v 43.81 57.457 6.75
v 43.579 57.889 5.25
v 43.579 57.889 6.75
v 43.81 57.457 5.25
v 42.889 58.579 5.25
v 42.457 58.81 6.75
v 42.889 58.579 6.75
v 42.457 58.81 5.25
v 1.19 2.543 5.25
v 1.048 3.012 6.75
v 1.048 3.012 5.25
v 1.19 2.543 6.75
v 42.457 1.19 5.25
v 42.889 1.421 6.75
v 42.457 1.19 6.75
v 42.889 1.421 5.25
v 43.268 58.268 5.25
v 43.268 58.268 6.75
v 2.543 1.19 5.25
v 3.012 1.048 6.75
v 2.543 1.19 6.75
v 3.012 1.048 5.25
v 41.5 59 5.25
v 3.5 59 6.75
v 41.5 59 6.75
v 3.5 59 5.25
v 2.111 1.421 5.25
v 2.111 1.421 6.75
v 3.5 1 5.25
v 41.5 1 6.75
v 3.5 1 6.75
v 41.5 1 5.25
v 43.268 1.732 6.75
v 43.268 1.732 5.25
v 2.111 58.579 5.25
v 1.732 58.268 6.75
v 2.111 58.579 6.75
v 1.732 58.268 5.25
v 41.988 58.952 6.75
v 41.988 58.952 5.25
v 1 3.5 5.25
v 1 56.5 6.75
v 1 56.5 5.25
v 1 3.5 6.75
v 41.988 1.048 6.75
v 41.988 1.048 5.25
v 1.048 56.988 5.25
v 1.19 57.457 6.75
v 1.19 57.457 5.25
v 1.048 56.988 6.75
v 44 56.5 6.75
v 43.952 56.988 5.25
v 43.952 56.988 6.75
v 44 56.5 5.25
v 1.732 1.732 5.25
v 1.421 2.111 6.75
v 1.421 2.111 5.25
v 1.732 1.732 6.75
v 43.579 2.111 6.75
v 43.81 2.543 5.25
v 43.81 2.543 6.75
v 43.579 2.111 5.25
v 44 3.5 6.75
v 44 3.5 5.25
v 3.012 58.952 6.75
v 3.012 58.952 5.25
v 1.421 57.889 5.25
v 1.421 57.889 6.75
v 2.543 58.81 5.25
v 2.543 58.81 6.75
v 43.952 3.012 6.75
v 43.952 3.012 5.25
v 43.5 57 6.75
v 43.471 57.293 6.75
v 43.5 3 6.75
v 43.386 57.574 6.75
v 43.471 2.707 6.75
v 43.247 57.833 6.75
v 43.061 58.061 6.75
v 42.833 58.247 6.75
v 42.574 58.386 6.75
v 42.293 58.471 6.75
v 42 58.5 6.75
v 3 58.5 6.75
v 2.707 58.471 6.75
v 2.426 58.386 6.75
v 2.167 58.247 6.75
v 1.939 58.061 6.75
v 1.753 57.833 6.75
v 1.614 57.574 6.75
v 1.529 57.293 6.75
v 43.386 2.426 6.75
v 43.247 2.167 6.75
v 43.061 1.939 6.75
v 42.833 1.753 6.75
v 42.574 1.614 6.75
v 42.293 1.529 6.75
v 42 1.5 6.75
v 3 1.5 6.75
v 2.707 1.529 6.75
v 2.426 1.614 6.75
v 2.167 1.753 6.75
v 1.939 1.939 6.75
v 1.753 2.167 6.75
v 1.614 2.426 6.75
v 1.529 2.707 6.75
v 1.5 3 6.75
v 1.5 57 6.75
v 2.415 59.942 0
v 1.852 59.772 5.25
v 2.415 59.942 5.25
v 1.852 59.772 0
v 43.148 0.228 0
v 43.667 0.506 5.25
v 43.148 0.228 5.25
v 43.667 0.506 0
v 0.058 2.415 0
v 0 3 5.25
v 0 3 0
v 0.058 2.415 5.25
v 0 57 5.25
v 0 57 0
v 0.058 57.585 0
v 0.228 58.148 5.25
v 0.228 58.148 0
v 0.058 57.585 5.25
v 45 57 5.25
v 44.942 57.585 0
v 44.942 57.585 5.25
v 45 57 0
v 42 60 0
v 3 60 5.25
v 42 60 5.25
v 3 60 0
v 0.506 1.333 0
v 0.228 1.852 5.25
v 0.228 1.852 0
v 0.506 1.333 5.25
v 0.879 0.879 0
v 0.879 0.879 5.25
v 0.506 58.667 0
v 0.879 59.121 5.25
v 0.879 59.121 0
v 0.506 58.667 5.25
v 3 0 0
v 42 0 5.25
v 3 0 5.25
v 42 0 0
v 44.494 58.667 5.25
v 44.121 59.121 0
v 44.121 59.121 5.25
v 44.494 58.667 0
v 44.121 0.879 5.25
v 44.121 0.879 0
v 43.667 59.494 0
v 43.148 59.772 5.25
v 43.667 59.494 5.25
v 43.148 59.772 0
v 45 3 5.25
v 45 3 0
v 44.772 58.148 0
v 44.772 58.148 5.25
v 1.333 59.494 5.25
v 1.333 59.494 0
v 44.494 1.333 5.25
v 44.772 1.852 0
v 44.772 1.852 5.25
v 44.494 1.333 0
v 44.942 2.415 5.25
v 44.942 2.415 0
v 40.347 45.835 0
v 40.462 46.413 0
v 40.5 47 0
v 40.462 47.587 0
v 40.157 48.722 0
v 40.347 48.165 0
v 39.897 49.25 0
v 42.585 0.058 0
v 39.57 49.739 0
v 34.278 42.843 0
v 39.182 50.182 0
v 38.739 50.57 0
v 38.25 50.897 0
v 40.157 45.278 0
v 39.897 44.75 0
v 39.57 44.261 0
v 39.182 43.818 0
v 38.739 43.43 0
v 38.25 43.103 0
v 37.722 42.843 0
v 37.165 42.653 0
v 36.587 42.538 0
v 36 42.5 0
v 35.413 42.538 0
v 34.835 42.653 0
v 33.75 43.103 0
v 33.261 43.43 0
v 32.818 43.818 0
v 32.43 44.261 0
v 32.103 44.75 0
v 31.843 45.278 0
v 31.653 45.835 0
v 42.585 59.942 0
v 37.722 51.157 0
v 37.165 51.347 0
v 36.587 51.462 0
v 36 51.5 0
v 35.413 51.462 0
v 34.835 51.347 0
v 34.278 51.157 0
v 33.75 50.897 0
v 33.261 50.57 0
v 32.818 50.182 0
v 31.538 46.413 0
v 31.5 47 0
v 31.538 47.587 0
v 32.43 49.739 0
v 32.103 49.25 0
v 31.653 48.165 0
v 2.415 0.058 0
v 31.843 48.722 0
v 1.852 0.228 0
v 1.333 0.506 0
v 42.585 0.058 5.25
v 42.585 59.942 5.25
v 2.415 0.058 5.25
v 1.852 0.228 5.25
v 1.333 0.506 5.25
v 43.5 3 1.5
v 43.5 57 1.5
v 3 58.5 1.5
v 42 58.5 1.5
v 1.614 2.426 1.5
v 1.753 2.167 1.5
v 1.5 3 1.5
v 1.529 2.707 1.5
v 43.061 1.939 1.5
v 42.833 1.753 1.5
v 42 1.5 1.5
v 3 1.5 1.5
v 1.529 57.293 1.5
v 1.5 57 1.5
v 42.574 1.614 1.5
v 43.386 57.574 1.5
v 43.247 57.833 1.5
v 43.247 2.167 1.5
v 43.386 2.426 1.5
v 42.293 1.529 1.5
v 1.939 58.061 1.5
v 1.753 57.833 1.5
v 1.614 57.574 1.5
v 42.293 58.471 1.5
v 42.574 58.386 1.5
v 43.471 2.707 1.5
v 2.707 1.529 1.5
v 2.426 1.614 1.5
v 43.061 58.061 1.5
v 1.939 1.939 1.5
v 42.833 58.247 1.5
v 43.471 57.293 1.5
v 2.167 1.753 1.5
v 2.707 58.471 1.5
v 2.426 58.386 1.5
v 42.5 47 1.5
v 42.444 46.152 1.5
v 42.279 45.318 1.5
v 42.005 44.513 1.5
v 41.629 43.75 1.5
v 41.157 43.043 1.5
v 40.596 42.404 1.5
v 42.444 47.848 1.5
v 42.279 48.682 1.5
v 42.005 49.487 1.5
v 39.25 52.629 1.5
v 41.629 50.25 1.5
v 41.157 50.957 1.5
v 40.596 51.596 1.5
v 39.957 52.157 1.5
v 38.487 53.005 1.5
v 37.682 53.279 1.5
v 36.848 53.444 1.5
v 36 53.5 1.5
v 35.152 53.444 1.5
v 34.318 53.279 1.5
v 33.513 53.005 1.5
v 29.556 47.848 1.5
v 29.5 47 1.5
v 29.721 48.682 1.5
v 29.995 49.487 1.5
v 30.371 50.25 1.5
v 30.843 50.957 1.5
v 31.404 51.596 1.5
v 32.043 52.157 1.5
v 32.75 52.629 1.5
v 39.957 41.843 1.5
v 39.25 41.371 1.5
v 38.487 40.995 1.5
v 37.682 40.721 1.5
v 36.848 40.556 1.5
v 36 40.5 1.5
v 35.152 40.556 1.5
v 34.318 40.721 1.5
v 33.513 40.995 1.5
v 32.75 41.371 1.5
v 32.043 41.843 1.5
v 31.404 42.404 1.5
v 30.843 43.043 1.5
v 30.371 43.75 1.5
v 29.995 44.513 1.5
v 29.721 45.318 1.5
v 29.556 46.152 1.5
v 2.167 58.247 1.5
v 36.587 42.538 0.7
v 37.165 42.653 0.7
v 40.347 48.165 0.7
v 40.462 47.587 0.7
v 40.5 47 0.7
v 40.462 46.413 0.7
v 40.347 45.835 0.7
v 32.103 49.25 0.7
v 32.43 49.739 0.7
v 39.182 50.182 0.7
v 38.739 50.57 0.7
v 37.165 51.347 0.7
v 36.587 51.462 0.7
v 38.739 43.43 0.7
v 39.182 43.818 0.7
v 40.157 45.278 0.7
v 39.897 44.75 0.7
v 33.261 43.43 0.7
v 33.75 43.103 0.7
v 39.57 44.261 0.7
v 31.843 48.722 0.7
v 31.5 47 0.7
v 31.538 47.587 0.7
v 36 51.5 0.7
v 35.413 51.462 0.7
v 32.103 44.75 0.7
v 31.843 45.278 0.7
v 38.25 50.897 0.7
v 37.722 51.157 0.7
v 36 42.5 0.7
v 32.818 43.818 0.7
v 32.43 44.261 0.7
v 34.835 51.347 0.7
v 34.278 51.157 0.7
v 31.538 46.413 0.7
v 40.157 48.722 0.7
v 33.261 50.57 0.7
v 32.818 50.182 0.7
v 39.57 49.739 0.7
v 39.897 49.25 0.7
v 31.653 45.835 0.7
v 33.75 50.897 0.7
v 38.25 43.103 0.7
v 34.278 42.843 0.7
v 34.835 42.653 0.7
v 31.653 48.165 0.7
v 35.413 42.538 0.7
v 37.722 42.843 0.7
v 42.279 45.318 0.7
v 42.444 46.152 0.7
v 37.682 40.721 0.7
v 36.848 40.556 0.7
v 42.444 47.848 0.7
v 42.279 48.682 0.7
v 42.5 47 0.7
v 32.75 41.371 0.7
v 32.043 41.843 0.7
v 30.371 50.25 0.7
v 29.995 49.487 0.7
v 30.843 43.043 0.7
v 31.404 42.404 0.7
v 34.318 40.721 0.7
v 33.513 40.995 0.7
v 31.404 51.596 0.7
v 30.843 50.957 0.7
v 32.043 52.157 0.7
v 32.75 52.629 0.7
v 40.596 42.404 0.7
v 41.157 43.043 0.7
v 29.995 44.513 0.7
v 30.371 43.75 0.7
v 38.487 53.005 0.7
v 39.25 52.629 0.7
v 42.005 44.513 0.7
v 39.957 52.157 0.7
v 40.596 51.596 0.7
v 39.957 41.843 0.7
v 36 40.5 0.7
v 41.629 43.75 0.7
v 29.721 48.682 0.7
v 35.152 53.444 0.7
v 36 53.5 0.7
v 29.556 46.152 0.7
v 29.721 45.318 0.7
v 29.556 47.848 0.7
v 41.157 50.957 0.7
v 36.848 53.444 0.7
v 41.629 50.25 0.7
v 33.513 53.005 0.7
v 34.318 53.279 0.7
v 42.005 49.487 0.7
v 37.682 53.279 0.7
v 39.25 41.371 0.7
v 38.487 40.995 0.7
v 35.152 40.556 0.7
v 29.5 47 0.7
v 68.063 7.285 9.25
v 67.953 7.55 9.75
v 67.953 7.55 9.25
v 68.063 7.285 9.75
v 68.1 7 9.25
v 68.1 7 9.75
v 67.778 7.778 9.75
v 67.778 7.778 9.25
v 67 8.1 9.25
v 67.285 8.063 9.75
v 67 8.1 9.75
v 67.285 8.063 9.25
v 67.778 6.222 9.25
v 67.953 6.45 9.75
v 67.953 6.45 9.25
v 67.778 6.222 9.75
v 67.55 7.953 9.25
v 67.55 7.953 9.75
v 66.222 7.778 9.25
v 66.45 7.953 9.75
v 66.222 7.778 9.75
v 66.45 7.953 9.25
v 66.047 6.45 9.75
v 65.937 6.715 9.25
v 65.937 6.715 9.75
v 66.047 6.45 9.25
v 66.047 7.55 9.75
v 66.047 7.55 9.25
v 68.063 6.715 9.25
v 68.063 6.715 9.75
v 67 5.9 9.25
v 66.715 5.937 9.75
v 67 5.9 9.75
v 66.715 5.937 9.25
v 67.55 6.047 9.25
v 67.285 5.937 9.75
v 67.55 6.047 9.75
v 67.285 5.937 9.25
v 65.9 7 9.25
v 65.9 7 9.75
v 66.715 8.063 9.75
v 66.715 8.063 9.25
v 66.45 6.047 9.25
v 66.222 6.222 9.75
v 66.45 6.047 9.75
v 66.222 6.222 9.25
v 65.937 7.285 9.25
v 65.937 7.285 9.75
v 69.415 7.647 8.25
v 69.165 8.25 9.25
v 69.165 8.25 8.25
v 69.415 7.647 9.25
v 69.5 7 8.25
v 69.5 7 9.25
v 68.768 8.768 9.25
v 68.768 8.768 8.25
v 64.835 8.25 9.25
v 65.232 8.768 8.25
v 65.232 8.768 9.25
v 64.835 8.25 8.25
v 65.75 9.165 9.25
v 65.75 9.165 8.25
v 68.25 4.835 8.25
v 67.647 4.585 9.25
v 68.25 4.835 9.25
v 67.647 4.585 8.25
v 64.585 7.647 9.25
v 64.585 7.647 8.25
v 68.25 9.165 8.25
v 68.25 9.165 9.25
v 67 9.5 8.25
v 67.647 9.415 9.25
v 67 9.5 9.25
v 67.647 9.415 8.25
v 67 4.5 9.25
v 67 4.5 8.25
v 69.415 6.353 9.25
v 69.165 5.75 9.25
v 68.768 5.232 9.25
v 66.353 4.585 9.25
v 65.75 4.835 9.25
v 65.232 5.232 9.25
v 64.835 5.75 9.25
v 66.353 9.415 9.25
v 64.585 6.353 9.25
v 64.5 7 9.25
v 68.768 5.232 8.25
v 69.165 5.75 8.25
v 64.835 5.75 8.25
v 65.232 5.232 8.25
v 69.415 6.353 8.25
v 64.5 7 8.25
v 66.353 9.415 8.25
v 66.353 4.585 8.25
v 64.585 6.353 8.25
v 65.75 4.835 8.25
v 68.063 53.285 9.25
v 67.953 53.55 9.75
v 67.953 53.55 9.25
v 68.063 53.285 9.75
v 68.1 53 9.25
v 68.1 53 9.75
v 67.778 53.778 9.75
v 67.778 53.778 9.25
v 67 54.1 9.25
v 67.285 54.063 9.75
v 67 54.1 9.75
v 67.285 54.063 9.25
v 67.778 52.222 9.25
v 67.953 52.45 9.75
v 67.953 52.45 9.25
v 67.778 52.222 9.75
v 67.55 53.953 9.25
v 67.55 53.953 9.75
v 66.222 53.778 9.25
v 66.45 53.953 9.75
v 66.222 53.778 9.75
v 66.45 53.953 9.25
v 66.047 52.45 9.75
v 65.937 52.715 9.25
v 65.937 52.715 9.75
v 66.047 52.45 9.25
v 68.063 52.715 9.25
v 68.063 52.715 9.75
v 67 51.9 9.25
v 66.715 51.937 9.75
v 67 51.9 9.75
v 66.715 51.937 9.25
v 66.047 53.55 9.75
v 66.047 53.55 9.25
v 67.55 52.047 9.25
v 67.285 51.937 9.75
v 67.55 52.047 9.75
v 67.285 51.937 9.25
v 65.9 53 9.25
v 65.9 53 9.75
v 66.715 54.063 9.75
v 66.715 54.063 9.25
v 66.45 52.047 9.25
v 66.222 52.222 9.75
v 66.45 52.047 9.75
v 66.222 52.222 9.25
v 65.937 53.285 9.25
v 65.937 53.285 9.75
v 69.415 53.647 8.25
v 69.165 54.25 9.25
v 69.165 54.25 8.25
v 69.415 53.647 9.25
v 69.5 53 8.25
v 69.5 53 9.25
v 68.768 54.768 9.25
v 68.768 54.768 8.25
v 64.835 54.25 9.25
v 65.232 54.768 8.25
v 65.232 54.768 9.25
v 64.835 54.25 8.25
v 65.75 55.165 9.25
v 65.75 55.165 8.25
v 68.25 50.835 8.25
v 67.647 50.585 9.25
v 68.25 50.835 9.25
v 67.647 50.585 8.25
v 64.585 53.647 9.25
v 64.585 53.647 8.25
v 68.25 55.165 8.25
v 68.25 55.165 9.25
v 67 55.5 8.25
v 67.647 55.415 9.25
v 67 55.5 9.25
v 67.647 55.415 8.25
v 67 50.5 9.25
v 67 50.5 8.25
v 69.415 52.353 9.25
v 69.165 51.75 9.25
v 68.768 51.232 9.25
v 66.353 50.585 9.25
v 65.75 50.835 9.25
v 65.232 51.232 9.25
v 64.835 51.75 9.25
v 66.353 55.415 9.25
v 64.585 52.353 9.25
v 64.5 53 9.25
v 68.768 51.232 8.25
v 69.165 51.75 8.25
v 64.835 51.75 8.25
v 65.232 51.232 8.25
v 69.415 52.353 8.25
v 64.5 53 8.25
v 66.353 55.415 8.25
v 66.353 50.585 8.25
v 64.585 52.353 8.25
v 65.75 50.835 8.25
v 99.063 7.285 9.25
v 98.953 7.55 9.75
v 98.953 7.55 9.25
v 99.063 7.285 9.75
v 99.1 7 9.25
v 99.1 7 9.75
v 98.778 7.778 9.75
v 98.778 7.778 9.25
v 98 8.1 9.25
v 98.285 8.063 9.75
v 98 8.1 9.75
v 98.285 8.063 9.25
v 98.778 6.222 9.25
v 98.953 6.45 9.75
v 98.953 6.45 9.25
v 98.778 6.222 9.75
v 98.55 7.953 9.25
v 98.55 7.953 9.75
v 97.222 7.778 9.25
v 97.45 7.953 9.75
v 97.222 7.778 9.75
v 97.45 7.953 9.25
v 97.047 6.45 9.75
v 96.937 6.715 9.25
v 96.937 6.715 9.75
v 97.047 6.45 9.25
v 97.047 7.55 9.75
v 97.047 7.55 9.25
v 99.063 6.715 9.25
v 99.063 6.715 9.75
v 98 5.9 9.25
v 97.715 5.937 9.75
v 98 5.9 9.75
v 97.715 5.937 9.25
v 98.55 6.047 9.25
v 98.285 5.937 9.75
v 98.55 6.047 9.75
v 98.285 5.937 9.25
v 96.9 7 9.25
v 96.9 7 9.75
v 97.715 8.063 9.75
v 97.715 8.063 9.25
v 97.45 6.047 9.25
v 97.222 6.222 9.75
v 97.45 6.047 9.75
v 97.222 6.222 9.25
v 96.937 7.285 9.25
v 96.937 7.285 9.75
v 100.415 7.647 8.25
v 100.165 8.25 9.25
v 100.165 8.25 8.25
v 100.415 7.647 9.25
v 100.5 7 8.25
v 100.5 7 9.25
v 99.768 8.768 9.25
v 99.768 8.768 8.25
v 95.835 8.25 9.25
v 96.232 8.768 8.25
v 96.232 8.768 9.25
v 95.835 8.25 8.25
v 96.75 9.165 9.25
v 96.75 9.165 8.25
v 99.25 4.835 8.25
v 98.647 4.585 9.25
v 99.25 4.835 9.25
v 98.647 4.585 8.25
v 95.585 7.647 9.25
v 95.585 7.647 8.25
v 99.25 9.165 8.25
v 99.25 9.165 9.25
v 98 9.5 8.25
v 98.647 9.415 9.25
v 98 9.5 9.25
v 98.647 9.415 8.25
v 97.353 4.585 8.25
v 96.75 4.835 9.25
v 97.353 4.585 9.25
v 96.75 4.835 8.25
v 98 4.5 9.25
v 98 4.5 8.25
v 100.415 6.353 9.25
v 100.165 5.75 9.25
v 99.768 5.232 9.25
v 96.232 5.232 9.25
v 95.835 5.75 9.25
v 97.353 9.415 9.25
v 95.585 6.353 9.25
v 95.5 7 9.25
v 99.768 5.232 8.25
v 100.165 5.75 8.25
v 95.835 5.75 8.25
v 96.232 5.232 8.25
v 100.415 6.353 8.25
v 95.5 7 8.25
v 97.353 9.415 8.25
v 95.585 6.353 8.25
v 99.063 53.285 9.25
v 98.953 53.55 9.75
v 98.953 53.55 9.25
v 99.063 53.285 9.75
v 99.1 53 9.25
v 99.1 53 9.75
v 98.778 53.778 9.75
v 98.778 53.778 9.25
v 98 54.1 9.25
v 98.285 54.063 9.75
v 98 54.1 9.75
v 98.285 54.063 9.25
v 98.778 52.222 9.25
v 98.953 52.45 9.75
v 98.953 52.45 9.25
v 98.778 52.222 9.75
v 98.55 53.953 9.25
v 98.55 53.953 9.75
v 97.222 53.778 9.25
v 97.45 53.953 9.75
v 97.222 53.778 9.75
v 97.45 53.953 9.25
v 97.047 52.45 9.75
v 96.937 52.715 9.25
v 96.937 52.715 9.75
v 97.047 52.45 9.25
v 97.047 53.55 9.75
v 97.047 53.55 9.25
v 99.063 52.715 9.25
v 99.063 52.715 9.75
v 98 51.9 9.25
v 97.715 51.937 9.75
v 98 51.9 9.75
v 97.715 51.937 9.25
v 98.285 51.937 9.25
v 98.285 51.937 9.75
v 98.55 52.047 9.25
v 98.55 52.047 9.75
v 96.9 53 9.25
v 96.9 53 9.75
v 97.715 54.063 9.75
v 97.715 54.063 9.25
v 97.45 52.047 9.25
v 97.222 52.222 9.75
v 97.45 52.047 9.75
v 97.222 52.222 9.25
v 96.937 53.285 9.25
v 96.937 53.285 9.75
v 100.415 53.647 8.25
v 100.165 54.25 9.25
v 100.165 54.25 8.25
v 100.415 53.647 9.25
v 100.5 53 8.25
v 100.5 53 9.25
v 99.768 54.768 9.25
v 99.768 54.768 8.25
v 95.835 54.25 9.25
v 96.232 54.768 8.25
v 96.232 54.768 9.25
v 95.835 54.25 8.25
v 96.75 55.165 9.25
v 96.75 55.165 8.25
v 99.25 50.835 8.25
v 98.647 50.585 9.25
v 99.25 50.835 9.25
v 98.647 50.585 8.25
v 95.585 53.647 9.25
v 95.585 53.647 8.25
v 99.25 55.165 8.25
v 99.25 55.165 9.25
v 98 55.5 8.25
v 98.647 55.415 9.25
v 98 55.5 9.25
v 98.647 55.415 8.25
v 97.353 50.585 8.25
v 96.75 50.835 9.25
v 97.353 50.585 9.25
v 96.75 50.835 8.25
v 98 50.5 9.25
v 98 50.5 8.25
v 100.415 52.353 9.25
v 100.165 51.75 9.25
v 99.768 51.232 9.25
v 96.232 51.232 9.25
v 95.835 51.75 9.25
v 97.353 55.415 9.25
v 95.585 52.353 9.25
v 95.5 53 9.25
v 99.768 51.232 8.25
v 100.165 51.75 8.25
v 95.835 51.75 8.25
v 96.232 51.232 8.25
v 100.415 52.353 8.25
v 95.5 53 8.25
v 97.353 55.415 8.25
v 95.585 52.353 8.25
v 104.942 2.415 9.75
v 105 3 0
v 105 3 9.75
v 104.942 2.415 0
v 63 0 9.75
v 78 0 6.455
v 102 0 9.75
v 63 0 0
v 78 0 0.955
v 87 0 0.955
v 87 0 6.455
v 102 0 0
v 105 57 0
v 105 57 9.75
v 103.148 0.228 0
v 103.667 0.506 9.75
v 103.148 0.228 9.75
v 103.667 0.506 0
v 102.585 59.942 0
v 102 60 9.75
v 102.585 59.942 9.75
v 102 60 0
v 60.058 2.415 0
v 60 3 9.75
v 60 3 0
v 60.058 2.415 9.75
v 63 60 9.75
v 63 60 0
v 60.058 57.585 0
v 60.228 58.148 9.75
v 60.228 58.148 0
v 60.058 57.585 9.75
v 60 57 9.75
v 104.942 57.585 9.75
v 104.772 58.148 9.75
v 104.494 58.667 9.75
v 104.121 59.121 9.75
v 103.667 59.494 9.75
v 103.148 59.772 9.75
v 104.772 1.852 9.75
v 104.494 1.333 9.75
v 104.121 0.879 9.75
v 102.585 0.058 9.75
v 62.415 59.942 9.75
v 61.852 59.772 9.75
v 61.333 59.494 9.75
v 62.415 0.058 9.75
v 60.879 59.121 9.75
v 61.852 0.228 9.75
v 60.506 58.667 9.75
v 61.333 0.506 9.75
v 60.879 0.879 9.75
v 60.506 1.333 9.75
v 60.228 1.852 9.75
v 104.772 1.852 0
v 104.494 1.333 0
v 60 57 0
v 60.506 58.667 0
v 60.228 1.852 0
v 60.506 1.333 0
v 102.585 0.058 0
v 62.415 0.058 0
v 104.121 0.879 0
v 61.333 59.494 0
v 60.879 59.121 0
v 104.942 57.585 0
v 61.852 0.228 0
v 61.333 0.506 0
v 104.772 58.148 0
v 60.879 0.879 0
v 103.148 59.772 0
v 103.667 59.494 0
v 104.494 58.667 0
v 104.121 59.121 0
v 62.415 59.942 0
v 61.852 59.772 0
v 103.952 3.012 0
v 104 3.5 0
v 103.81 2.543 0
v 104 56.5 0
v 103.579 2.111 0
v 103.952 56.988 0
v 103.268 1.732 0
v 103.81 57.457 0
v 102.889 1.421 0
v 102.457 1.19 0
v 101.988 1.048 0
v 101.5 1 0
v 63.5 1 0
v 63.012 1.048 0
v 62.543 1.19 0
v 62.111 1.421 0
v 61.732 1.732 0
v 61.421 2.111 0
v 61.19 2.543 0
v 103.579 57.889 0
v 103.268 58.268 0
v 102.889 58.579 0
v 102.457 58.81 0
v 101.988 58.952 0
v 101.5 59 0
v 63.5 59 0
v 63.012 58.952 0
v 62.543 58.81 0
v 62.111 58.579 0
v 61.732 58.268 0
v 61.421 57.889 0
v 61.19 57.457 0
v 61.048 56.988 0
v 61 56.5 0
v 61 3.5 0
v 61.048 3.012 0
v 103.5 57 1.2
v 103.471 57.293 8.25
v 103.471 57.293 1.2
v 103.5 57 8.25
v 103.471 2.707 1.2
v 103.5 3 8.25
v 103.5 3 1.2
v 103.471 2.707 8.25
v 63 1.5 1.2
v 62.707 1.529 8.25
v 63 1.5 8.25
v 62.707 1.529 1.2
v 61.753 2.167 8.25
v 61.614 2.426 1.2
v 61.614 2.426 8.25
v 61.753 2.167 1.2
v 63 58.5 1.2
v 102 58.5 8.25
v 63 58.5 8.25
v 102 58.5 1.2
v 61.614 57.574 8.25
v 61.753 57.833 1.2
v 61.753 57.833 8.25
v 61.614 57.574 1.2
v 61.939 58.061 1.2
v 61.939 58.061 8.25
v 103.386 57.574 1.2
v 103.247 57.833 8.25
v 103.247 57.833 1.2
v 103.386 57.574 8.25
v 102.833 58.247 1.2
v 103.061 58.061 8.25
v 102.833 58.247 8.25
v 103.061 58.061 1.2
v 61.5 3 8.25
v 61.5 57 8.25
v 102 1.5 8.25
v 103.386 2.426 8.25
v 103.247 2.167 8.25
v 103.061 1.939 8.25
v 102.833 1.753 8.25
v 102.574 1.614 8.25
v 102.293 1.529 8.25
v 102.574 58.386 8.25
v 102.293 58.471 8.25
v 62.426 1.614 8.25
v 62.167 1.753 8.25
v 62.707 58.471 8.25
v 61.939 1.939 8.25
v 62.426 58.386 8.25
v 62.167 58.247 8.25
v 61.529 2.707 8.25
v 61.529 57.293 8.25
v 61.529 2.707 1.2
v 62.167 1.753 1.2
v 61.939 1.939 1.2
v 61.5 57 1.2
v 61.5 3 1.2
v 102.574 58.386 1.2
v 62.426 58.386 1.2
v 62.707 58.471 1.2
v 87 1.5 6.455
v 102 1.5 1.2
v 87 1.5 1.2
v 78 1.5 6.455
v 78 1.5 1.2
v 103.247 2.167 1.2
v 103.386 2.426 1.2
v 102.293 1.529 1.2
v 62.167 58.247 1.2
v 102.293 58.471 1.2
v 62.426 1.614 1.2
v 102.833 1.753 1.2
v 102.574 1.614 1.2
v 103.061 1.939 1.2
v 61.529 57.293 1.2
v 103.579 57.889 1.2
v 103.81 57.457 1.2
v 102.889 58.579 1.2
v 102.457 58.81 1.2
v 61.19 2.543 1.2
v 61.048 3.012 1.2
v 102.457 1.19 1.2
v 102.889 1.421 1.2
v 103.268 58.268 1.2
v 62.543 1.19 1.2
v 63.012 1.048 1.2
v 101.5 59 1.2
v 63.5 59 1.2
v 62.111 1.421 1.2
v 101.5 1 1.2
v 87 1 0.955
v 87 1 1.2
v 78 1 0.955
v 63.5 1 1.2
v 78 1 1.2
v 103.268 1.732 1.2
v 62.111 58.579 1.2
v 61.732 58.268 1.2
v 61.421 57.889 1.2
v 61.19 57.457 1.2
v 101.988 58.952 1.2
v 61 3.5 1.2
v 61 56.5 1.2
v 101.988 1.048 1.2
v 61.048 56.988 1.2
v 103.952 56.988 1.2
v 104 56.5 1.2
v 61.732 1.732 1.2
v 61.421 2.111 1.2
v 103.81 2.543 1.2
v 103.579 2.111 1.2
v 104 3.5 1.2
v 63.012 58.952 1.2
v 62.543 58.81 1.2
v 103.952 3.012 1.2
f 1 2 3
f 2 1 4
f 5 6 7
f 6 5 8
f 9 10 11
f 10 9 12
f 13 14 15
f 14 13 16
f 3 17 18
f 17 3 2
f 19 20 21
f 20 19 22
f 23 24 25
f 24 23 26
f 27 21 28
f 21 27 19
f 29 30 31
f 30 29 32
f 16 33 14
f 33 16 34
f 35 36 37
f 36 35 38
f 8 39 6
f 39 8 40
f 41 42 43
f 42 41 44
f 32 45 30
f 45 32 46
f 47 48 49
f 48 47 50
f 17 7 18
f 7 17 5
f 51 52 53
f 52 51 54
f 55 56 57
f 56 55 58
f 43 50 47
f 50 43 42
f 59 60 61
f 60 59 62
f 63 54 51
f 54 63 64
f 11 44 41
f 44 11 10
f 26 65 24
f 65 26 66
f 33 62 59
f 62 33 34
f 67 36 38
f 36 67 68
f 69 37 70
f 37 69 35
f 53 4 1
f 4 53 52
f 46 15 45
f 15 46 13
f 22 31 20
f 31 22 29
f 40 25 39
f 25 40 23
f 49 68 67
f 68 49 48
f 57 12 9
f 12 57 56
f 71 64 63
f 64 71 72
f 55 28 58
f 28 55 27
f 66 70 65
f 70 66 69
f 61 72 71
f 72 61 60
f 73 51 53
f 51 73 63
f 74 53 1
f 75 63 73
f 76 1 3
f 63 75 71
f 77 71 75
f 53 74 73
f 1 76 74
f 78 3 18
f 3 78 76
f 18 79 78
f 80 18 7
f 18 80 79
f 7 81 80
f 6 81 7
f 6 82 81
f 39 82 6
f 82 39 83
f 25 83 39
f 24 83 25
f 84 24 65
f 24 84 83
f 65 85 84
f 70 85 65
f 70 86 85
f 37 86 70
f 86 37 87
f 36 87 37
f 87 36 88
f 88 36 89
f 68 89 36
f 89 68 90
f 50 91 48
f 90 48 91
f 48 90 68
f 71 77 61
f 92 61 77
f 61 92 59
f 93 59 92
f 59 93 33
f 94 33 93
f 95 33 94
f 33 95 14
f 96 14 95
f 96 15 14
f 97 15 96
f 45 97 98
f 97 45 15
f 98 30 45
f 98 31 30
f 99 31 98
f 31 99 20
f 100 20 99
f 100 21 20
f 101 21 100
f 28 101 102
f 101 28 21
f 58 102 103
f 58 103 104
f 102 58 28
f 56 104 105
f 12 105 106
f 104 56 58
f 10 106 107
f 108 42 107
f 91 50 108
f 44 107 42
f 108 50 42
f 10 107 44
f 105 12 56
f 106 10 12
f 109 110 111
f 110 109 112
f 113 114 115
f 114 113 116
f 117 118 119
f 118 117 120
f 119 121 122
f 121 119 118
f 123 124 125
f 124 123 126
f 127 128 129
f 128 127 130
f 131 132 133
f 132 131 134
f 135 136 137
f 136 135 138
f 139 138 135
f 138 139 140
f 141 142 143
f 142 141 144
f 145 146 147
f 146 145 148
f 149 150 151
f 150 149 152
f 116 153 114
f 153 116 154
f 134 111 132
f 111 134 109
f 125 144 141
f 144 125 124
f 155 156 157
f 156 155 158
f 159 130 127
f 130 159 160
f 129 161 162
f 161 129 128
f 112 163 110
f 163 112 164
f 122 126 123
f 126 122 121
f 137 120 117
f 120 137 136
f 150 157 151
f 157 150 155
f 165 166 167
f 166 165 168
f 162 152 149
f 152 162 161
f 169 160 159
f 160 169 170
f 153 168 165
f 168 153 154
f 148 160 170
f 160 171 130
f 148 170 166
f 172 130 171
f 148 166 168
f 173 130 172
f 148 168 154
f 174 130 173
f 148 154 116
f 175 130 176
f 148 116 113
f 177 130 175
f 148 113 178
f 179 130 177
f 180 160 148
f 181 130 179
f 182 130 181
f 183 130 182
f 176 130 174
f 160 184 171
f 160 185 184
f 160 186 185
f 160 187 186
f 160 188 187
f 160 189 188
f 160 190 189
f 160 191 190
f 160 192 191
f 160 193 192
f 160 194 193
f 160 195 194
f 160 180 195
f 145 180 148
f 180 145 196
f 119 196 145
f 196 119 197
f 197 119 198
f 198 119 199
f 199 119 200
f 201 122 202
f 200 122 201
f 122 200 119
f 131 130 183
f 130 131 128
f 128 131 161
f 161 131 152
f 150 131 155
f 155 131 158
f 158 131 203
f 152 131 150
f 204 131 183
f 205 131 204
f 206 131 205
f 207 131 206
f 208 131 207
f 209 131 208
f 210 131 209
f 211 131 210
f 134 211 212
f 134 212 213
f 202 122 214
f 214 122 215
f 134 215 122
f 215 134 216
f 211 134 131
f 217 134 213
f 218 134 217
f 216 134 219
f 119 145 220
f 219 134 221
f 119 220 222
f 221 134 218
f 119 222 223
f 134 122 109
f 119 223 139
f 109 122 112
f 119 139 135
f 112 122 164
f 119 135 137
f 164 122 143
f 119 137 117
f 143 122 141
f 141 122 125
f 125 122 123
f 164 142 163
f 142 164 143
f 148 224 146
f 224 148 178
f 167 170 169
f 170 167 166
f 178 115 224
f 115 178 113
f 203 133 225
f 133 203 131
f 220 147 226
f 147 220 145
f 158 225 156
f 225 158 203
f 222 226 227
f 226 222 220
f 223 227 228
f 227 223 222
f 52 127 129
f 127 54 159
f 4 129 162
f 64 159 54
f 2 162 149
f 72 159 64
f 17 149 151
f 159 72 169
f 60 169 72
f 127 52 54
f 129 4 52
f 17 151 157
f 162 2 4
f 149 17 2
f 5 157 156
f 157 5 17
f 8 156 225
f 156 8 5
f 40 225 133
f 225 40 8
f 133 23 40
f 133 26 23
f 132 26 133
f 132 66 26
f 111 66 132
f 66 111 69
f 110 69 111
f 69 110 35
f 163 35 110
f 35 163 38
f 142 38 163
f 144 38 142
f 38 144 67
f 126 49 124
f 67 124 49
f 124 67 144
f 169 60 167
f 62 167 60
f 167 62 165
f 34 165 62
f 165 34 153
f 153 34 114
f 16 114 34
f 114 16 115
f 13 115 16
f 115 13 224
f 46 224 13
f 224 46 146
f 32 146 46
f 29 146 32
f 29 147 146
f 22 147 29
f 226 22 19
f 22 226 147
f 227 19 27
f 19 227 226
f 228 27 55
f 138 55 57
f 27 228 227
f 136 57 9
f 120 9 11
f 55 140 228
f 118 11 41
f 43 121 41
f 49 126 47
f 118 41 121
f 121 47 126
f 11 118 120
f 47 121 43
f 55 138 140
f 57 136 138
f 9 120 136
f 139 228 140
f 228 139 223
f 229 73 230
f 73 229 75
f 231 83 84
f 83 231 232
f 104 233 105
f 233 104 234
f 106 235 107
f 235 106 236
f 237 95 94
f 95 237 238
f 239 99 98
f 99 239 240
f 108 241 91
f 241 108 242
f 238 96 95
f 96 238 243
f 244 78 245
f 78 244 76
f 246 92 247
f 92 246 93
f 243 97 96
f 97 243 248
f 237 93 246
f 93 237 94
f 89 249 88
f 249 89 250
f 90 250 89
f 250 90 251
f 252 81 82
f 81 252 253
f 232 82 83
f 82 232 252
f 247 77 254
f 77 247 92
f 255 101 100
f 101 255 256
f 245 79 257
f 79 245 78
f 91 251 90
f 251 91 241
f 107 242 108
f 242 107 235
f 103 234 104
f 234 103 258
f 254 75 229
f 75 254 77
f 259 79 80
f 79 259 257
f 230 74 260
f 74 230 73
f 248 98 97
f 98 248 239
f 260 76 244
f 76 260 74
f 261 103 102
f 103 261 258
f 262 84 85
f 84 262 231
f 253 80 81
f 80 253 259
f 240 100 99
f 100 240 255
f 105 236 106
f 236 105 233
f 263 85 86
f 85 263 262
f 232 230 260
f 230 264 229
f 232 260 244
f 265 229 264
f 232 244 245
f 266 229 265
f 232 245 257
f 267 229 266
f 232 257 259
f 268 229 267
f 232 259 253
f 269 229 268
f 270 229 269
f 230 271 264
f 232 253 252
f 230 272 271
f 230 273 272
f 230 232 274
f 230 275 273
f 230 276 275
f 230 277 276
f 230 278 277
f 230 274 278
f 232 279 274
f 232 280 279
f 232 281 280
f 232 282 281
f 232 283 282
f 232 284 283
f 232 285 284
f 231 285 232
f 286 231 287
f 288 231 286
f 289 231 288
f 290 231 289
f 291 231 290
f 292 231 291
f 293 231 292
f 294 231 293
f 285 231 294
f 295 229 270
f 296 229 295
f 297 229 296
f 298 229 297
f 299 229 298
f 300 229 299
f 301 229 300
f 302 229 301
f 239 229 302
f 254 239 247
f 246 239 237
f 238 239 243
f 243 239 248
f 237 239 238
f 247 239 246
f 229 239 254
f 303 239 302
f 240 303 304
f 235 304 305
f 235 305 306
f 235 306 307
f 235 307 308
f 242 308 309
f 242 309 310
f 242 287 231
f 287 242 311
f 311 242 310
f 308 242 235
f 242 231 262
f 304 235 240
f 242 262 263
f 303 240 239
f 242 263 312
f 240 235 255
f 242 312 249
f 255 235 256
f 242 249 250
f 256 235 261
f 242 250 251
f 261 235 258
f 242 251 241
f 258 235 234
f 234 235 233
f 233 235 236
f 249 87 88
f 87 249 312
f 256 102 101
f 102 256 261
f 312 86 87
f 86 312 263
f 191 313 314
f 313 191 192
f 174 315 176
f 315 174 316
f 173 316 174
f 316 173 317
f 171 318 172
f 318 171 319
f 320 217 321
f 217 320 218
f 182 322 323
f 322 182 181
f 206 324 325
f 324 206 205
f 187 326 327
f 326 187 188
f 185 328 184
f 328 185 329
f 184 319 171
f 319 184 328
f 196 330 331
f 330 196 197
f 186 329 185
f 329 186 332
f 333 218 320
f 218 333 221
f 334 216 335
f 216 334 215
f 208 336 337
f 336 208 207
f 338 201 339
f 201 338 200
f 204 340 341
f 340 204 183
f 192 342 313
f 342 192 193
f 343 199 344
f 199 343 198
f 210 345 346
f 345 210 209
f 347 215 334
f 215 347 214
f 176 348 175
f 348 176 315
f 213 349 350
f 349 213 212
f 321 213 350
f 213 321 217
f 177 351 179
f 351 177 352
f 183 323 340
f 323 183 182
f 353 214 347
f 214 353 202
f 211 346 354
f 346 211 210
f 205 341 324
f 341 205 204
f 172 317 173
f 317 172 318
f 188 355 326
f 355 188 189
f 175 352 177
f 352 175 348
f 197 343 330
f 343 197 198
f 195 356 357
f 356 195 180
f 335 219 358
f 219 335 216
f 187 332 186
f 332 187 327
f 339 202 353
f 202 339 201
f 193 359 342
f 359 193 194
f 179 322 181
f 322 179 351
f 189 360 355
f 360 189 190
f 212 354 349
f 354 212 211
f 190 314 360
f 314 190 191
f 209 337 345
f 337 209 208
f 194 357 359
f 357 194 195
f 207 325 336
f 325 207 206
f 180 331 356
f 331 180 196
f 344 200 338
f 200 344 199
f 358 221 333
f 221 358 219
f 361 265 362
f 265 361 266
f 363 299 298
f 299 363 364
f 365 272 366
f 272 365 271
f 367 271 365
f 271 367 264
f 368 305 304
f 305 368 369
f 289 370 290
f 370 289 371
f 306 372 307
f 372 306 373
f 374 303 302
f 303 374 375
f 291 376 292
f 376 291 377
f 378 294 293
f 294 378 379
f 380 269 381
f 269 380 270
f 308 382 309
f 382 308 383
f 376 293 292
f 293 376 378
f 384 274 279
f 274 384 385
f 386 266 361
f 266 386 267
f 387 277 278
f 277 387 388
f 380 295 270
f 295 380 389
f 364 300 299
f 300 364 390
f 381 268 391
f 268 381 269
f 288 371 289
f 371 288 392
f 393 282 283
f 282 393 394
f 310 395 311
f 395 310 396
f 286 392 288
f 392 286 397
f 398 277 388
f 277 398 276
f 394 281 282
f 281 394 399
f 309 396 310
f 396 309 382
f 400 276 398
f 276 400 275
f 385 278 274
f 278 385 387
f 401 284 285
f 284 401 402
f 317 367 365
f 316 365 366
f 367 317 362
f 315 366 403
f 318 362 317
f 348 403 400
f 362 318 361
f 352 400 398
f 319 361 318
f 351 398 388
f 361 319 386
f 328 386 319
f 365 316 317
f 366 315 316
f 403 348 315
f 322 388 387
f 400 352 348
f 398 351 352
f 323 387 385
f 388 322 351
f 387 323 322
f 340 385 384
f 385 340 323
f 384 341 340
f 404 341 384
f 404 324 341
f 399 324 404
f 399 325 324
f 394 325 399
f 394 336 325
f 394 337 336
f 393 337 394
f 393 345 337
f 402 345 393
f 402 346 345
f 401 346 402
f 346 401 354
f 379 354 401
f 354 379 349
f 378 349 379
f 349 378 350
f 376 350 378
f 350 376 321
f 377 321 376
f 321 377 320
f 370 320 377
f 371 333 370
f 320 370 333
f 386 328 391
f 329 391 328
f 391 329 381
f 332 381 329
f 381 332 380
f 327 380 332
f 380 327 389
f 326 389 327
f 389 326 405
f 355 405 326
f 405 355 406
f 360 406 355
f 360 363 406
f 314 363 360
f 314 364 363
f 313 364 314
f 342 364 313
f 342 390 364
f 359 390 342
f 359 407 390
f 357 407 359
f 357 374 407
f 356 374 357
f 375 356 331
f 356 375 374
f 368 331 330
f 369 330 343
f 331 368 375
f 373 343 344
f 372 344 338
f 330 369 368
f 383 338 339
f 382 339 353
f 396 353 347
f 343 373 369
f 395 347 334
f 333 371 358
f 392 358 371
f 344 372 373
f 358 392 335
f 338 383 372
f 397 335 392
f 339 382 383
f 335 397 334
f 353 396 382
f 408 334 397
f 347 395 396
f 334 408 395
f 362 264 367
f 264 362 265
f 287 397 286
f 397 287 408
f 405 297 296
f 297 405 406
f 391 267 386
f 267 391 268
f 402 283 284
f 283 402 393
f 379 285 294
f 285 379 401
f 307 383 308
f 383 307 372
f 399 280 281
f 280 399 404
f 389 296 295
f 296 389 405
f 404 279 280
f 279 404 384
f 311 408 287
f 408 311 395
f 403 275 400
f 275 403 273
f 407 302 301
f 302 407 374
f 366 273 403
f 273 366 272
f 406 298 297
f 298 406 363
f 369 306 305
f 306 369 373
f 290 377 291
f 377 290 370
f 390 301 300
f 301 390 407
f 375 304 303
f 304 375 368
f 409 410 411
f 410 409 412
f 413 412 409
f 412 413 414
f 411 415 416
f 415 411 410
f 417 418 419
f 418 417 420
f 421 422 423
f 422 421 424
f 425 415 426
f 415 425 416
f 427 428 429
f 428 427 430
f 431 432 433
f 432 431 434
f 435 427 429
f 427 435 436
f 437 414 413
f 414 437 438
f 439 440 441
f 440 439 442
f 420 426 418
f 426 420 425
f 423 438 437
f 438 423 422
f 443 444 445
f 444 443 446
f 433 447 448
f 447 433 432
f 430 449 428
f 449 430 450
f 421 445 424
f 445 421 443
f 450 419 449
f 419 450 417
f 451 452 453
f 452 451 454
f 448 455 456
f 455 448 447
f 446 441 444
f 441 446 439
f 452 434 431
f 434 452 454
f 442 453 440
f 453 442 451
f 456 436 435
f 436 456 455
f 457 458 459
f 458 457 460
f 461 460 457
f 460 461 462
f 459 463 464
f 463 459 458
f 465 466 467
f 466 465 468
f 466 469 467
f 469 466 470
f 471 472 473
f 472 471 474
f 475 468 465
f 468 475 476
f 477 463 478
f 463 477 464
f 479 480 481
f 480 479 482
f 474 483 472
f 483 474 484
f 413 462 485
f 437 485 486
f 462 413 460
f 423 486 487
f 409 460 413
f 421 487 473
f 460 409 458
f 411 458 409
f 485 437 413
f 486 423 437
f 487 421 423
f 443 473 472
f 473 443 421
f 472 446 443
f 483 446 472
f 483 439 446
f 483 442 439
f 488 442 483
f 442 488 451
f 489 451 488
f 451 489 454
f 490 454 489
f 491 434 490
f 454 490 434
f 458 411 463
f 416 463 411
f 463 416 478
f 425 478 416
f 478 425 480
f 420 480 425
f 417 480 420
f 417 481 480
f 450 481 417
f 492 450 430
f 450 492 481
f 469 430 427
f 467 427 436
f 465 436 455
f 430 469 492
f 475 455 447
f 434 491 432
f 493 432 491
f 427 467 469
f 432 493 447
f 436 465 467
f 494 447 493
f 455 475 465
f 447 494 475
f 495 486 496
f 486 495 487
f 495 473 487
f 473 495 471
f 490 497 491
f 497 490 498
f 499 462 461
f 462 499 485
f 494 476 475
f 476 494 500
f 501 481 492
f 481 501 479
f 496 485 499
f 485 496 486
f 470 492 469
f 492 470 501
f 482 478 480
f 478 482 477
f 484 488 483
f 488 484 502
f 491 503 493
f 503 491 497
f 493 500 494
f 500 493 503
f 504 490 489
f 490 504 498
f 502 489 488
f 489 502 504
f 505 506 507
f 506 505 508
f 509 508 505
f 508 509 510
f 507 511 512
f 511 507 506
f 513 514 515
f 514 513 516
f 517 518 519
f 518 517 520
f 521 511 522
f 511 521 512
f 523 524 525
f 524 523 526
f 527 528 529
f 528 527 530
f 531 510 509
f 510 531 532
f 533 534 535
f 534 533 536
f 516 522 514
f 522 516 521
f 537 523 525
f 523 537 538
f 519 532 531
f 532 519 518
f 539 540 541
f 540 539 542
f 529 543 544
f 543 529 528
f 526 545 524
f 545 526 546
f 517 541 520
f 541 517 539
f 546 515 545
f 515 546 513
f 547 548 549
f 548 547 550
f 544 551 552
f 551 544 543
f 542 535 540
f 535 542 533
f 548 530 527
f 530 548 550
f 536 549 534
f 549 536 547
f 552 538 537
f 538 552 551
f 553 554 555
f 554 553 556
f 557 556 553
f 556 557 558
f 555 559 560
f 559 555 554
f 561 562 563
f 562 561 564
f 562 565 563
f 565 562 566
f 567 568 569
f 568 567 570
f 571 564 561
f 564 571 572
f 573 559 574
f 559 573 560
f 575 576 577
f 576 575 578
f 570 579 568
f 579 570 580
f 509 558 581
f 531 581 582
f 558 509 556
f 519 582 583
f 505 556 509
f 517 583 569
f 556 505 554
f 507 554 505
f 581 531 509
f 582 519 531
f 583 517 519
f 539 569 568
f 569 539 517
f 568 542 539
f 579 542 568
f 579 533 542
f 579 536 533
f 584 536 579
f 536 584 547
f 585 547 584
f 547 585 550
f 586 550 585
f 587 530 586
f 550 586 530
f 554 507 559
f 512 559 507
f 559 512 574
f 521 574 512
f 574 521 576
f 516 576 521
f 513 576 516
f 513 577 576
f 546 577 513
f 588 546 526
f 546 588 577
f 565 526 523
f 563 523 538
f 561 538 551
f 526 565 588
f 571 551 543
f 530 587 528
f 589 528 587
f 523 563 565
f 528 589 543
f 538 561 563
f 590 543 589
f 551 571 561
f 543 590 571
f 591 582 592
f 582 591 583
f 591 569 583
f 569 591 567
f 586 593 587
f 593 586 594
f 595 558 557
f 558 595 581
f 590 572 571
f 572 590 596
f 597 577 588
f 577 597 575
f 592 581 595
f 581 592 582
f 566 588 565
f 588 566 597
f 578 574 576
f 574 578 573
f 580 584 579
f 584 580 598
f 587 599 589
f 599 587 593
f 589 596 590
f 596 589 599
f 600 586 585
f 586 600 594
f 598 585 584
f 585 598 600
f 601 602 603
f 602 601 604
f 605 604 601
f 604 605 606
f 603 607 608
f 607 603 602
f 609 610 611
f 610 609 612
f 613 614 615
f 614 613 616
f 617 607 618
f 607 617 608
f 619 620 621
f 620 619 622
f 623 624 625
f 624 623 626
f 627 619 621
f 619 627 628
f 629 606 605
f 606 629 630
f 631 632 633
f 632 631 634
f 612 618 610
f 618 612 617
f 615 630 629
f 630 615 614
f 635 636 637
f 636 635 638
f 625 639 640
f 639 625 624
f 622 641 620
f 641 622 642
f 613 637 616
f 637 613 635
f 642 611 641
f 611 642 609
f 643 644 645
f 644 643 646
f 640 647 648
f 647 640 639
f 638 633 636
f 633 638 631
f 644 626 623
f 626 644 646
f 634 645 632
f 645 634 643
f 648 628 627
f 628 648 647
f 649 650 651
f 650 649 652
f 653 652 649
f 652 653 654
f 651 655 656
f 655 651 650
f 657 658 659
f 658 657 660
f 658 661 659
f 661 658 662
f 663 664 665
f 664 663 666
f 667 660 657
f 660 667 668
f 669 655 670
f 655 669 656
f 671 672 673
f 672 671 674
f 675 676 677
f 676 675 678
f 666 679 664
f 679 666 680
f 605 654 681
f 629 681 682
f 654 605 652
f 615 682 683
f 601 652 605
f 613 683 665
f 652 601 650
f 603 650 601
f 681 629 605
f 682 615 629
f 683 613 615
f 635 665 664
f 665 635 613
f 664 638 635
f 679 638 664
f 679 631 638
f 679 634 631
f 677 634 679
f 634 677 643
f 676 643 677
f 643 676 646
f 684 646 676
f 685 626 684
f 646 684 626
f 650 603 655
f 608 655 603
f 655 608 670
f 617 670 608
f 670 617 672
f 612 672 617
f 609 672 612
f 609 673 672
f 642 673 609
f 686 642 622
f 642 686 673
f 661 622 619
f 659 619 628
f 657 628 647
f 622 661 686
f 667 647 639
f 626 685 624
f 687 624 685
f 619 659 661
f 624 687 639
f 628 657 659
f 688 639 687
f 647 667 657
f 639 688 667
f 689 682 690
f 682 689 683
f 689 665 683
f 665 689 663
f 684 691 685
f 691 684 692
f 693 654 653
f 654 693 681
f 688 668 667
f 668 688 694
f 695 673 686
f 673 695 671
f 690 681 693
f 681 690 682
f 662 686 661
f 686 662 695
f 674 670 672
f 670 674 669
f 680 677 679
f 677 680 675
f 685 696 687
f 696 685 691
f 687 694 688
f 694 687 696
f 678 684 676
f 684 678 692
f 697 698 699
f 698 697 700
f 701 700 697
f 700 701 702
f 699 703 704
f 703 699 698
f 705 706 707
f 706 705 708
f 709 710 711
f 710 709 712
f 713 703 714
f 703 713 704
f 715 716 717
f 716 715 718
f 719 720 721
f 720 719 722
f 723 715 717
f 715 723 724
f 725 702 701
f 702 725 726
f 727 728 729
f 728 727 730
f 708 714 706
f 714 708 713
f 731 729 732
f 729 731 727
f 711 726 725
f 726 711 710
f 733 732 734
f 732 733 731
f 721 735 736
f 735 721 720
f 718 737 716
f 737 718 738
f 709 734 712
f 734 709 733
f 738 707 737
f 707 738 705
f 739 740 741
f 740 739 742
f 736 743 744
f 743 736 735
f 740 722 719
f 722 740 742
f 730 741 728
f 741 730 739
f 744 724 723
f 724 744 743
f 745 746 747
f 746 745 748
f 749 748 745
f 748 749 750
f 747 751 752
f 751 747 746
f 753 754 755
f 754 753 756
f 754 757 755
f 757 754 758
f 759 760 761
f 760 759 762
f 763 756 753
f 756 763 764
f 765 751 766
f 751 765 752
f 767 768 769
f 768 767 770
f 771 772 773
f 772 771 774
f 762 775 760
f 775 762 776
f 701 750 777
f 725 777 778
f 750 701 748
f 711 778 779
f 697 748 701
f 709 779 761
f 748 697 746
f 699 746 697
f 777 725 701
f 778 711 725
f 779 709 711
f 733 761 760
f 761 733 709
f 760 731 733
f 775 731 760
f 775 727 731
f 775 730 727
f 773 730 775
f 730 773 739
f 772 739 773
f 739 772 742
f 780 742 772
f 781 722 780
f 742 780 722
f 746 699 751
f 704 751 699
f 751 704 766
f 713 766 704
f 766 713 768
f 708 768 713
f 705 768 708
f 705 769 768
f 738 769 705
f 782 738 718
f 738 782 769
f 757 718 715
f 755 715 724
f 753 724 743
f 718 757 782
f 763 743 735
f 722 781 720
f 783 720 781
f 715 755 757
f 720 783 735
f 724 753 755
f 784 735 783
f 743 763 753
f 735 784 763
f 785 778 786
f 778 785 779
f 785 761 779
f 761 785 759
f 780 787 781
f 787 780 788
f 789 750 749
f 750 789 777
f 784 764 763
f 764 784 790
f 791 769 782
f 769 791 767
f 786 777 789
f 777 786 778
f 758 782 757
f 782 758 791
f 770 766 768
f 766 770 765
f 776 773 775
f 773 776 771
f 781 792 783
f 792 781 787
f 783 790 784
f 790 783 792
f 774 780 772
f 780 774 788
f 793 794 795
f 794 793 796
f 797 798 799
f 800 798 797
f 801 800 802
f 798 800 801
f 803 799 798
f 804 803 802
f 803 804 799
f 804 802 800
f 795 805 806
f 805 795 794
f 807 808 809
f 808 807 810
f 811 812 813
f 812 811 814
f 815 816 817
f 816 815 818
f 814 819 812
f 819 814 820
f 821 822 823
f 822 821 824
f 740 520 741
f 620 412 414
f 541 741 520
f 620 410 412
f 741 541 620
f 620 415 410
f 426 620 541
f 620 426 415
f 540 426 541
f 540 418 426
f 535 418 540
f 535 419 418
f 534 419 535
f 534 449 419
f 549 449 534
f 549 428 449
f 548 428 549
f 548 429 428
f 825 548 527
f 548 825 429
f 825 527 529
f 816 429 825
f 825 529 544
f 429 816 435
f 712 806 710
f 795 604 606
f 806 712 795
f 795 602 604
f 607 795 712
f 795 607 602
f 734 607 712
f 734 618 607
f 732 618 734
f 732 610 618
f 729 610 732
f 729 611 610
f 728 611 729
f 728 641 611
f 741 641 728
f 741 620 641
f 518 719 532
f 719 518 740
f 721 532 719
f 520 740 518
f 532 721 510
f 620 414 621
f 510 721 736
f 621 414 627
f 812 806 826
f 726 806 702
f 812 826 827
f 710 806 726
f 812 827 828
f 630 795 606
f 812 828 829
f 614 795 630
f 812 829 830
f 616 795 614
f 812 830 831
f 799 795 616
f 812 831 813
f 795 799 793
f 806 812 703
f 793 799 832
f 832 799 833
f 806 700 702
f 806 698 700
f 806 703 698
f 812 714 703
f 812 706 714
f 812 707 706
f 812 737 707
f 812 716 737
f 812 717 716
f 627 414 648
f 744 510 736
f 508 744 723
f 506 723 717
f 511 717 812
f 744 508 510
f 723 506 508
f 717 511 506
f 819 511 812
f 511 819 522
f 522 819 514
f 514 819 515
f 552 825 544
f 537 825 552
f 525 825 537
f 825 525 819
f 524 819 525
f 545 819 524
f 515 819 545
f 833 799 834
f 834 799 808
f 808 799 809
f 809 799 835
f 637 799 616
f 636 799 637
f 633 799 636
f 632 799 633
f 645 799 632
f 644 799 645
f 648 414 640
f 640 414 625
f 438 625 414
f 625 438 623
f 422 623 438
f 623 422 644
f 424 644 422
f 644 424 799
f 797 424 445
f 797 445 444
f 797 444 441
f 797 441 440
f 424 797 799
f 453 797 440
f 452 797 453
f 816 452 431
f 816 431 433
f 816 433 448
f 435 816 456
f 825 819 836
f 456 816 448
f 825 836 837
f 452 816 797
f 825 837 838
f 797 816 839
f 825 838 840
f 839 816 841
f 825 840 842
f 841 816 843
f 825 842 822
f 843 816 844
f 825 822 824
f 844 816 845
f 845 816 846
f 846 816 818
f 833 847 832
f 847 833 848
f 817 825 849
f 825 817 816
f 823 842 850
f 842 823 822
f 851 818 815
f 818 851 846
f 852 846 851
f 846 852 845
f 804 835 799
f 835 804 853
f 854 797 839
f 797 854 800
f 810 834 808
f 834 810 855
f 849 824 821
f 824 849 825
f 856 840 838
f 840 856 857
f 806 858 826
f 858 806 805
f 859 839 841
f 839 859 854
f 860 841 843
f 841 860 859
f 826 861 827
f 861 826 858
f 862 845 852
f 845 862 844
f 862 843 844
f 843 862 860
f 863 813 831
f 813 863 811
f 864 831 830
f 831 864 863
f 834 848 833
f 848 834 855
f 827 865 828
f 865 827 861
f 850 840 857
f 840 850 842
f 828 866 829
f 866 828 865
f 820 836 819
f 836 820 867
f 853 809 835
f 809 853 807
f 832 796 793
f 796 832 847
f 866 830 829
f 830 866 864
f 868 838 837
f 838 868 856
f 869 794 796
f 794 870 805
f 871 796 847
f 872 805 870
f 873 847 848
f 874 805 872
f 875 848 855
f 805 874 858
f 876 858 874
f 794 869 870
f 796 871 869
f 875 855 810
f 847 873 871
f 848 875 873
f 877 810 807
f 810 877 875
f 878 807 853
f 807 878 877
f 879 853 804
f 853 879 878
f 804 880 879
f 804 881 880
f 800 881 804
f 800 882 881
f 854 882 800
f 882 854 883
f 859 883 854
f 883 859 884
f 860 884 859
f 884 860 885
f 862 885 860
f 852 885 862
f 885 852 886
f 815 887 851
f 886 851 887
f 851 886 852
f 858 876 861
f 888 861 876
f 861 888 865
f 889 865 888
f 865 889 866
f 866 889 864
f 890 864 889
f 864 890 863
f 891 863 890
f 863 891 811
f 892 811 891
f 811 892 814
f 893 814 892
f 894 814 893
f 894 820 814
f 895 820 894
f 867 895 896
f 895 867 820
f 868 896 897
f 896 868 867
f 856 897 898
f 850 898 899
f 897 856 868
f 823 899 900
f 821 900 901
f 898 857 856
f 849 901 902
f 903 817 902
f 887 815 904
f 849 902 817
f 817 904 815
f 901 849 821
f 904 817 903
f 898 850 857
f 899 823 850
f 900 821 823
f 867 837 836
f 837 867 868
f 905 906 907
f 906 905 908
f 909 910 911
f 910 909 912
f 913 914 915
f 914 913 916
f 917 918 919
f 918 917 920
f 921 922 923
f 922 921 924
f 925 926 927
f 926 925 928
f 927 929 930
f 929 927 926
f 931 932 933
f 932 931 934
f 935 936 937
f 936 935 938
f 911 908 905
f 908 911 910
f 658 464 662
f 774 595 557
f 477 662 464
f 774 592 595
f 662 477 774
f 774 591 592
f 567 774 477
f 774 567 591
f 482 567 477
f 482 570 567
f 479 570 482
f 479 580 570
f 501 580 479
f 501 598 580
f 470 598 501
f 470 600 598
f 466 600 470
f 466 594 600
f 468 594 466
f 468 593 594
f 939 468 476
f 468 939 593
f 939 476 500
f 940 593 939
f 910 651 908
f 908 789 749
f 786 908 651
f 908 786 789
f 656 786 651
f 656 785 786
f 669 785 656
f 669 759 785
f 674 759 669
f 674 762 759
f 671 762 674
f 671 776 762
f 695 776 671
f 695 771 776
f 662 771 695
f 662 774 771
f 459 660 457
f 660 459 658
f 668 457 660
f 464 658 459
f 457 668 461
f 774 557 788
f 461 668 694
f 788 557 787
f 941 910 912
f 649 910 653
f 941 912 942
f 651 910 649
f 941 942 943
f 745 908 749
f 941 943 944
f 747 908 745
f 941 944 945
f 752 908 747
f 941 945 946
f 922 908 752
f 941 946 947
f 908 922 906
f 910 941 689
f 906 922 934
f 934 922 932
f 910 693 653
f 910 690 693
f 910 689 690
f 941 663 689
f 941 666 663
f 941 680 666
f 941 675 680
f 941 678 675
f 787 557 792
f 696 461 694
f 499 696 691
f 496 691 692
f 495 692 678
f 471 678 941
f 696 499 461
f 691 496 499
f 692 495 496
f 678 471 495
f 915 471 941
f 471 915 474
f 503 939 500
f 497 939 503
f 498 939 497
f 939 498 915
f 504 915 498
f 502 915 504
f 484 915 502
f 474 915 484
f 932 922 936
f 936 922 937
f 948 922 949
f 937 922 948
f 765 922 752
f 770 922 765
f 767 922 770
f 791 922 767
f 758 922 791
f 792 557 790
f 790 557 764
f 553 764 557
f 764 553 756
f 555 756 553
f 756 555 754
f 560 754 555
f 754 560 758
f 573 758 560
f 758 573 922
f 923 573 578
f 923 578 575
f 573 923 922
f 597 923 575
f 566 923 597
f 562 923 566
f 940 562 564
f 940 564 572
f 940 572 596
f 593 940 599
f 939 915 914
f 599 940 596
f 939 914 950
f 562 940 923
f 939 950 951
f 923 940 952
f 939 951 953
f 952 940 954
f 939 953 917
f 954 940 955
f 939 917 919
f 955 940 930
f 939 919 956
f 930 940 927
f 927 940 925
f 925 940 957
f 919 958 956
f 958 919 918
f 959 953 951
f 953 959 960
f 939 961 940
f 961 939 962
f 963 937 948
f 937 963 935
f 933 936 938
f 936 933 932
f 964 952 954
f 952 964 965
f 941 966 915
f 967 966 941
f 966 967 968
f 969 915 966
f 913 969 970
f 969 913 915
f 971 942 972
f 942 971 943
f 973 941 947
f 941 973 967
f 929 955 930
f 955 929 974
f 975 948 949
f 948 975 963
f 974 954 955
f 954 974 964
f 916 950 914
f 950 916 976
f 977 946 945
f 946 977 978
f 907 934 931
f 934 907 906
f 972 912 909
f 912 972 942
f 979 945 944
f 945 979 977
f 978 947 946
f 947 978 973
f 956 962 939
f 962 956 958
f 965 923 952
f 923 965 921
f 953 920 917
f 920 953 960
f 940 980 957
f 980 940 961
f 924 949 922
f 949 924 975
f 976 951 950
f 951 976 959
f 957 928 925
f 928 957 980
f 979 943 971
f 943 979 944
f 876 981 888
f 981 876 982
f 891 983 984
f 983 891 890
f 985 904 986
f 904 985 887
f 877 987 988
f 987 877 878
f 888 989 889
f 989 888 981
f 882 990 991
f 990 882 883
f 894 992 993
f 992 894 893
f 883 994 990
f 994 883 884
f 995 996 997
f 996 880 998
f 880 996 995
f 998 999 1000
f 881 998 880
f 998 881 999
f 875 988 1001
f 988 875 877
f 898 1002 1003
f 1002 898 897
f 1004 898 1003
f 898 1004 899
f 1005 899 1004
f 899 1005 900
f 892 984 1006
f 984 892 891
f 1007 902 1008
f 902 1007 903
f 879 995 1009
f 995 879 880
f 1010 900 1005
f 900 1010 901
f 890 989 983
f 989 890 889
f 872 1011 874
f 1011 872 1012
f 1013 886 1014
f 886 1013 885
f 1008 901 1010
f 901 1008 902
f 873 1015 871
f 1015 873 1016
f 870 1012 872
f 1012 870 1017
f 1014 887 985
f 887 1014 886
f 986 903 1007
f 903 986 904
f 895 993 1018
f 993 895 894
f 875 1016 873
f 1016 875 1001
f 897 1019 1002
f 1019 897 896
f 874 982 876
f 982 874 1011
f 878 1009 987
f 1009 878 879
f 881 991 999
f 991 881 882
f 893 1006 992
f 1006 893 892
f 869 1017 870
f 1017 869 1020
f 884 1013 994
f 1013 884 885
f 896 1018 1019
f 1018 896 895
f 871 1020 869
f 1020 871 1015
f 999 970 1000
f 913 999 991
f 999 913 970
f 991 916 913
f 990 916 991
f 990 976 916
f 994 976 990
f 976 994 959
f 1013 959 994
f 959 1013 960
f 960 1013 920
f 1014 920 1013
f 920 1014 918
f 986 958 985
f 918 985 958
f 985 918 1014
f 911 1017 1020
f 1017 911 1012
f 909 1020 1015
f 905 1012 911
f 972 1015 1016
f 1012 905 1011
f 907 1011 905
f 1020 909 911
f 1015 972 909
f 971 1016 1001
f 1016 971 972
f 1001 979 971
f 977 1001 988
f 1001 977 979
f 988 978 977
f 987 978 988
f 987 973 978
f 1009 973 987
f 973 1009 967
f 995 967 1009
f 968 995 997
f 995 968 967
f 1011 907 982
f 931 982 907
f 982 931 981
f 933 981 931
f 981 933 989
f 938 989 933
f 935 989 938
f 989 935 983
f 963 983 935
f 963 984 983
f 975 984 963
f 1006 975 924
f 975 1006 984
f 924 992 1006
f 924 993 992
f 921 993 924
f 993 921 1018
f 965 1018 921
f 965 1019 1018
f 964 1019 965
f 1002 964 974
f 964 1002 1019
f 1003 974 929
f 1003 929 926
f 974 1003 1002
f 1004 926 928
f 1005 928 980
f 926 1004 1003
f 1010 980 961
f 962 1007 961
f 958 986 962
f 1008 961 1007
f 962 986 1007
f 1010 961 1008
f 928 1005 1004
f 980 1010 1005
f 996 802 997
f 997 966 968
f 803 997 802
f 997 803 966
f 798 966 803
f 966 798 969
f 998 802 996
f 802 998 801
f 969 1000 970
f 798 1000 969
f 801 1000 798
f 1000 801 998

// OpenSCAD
// LifeLog Camera 外壳 — 挂绳式
// 打印: PLA/PETG, 0.2mm 层高, 15% 填充, 无需支撑
// 组装: M2x6 自攻螺丝 x4

/* [整体尺寸] */
body_w  = 45;    // 宽
body_h  = 60;    // 高
body_d  = 15;    // 总厚度

/* [壁厚] */
wall   = 1.5;
round  = 3;

/* [前壳深度占比] */
front_ratio = 0.35;

/* [摄像头孔 - 顶部偏右] */
cam_d  = 9;
cam_x  = 9;       // 孔中心距右边缘
cam_y  = 13;      // 孔中心距上边缘

/* [挂绳孔] */
lanyard_w = 14;
lanyard_d = 3.5;

/* [USB-C 开口] */
usb_w = 9;
usb_h = 5.5;
usb_z = 0.38;   // USB 口在后壳的深度位置比例

/* [螺丝] */
screw_d      = 2.2;
screw_head_d = 5;
screw_margin = 7;

// ── 基础体 ──
module rbrick(w, h, d, r) {
    hull() for(x=[r, w-r]) for(y=[r, h-r])
        translate([x, y, 0]) cylinder(r=r, h=d, $fn=32);
}

// ── 前壳 ──
module front_shell() {
    fh = body_d * front_ratio;

    difference() {
        union() {
            // 外壳主体
            rbrick(body_w, body_h, fh, round);

            // 合模定位唇 (嵌入后壳)
            translate([1, 1, fh - 0.5])
            difference() {
                rbrick(body_w - 2, body_h - 2, 2, round - 0.5);
                translate([0.8, 0.8, -1])
                    rbrick(body_w - 3.6, body_h - 3.6, 4, round - 1.2);
            }
        }

        // 内部挖空
        translate([wall, wall, wall])
            rbrick(body_w - wall*2, body_h - wall*2, fh + 2, round - wall);

        // 摄像头孔
        translate([body_w - cam_x, body_h - cam_y, -1])
            cylinder(d=cam_d, h=wall + 3, $fn=48);

        // 摄像头外圈沉台 (镜头法兰)
        translate([body_w - cam_x, body_h - cam_y, wall - 0.8])
            cylinder(d=cam_d + 4, h=2, $fn=48);
    }
}

// ── 后壳 ──
module back_shell() {
    bh = body_d * (1 - front_ratio);

    difference() {
        union() {
            // 外壳主体
            rbrick(body_w, body_h, bh, round);
        }

        // 内部挖空
        translate([wall, wall, 0])
            rbrick(body_w - wall*2, body_h - wall*2, bh - wall, round - wall);

        // 合模凹槽 (接收前壳定位唇)
        translate([1, 1, -1])
            rbrick(body_w - 2, body_h - 2, 2.2, round - 0.5);

        // USB-C 开口 (底部)
        translate([body_w/2 - usb_w/2, -1, bh * usb_z - usb_h/2])
            cube([usb_w, wall + 3, usb_h]);

        // 螺丝孔
        for (x = [screw_margin, body_w - screw_margin]) {
            for (y = [screw_margin, body_h - screw_margin]) {
                translate([x, y, bh - wall - 0.5]) {
                    cylinder(d=screw_d, h=wall + 2, $fn=24);
                    cylinder(d=screw_head_d, h=1.5, $fn=24);
                }
            }
        }
    }
}

// ── 分别展示 (渲染用) ──
module display() {
    // 前壳 - 左下
    color("LightSteelBlue", 0.9) front_shell();

    // 后壳 - 右上，内部朝上便于查看
    translate([body_w + 15, 0, 0])
        color("LightSlateGray", 0.9) back_shell();
}

display();

// 打印时用下面两行:
// front_shell();
// back_shell();
